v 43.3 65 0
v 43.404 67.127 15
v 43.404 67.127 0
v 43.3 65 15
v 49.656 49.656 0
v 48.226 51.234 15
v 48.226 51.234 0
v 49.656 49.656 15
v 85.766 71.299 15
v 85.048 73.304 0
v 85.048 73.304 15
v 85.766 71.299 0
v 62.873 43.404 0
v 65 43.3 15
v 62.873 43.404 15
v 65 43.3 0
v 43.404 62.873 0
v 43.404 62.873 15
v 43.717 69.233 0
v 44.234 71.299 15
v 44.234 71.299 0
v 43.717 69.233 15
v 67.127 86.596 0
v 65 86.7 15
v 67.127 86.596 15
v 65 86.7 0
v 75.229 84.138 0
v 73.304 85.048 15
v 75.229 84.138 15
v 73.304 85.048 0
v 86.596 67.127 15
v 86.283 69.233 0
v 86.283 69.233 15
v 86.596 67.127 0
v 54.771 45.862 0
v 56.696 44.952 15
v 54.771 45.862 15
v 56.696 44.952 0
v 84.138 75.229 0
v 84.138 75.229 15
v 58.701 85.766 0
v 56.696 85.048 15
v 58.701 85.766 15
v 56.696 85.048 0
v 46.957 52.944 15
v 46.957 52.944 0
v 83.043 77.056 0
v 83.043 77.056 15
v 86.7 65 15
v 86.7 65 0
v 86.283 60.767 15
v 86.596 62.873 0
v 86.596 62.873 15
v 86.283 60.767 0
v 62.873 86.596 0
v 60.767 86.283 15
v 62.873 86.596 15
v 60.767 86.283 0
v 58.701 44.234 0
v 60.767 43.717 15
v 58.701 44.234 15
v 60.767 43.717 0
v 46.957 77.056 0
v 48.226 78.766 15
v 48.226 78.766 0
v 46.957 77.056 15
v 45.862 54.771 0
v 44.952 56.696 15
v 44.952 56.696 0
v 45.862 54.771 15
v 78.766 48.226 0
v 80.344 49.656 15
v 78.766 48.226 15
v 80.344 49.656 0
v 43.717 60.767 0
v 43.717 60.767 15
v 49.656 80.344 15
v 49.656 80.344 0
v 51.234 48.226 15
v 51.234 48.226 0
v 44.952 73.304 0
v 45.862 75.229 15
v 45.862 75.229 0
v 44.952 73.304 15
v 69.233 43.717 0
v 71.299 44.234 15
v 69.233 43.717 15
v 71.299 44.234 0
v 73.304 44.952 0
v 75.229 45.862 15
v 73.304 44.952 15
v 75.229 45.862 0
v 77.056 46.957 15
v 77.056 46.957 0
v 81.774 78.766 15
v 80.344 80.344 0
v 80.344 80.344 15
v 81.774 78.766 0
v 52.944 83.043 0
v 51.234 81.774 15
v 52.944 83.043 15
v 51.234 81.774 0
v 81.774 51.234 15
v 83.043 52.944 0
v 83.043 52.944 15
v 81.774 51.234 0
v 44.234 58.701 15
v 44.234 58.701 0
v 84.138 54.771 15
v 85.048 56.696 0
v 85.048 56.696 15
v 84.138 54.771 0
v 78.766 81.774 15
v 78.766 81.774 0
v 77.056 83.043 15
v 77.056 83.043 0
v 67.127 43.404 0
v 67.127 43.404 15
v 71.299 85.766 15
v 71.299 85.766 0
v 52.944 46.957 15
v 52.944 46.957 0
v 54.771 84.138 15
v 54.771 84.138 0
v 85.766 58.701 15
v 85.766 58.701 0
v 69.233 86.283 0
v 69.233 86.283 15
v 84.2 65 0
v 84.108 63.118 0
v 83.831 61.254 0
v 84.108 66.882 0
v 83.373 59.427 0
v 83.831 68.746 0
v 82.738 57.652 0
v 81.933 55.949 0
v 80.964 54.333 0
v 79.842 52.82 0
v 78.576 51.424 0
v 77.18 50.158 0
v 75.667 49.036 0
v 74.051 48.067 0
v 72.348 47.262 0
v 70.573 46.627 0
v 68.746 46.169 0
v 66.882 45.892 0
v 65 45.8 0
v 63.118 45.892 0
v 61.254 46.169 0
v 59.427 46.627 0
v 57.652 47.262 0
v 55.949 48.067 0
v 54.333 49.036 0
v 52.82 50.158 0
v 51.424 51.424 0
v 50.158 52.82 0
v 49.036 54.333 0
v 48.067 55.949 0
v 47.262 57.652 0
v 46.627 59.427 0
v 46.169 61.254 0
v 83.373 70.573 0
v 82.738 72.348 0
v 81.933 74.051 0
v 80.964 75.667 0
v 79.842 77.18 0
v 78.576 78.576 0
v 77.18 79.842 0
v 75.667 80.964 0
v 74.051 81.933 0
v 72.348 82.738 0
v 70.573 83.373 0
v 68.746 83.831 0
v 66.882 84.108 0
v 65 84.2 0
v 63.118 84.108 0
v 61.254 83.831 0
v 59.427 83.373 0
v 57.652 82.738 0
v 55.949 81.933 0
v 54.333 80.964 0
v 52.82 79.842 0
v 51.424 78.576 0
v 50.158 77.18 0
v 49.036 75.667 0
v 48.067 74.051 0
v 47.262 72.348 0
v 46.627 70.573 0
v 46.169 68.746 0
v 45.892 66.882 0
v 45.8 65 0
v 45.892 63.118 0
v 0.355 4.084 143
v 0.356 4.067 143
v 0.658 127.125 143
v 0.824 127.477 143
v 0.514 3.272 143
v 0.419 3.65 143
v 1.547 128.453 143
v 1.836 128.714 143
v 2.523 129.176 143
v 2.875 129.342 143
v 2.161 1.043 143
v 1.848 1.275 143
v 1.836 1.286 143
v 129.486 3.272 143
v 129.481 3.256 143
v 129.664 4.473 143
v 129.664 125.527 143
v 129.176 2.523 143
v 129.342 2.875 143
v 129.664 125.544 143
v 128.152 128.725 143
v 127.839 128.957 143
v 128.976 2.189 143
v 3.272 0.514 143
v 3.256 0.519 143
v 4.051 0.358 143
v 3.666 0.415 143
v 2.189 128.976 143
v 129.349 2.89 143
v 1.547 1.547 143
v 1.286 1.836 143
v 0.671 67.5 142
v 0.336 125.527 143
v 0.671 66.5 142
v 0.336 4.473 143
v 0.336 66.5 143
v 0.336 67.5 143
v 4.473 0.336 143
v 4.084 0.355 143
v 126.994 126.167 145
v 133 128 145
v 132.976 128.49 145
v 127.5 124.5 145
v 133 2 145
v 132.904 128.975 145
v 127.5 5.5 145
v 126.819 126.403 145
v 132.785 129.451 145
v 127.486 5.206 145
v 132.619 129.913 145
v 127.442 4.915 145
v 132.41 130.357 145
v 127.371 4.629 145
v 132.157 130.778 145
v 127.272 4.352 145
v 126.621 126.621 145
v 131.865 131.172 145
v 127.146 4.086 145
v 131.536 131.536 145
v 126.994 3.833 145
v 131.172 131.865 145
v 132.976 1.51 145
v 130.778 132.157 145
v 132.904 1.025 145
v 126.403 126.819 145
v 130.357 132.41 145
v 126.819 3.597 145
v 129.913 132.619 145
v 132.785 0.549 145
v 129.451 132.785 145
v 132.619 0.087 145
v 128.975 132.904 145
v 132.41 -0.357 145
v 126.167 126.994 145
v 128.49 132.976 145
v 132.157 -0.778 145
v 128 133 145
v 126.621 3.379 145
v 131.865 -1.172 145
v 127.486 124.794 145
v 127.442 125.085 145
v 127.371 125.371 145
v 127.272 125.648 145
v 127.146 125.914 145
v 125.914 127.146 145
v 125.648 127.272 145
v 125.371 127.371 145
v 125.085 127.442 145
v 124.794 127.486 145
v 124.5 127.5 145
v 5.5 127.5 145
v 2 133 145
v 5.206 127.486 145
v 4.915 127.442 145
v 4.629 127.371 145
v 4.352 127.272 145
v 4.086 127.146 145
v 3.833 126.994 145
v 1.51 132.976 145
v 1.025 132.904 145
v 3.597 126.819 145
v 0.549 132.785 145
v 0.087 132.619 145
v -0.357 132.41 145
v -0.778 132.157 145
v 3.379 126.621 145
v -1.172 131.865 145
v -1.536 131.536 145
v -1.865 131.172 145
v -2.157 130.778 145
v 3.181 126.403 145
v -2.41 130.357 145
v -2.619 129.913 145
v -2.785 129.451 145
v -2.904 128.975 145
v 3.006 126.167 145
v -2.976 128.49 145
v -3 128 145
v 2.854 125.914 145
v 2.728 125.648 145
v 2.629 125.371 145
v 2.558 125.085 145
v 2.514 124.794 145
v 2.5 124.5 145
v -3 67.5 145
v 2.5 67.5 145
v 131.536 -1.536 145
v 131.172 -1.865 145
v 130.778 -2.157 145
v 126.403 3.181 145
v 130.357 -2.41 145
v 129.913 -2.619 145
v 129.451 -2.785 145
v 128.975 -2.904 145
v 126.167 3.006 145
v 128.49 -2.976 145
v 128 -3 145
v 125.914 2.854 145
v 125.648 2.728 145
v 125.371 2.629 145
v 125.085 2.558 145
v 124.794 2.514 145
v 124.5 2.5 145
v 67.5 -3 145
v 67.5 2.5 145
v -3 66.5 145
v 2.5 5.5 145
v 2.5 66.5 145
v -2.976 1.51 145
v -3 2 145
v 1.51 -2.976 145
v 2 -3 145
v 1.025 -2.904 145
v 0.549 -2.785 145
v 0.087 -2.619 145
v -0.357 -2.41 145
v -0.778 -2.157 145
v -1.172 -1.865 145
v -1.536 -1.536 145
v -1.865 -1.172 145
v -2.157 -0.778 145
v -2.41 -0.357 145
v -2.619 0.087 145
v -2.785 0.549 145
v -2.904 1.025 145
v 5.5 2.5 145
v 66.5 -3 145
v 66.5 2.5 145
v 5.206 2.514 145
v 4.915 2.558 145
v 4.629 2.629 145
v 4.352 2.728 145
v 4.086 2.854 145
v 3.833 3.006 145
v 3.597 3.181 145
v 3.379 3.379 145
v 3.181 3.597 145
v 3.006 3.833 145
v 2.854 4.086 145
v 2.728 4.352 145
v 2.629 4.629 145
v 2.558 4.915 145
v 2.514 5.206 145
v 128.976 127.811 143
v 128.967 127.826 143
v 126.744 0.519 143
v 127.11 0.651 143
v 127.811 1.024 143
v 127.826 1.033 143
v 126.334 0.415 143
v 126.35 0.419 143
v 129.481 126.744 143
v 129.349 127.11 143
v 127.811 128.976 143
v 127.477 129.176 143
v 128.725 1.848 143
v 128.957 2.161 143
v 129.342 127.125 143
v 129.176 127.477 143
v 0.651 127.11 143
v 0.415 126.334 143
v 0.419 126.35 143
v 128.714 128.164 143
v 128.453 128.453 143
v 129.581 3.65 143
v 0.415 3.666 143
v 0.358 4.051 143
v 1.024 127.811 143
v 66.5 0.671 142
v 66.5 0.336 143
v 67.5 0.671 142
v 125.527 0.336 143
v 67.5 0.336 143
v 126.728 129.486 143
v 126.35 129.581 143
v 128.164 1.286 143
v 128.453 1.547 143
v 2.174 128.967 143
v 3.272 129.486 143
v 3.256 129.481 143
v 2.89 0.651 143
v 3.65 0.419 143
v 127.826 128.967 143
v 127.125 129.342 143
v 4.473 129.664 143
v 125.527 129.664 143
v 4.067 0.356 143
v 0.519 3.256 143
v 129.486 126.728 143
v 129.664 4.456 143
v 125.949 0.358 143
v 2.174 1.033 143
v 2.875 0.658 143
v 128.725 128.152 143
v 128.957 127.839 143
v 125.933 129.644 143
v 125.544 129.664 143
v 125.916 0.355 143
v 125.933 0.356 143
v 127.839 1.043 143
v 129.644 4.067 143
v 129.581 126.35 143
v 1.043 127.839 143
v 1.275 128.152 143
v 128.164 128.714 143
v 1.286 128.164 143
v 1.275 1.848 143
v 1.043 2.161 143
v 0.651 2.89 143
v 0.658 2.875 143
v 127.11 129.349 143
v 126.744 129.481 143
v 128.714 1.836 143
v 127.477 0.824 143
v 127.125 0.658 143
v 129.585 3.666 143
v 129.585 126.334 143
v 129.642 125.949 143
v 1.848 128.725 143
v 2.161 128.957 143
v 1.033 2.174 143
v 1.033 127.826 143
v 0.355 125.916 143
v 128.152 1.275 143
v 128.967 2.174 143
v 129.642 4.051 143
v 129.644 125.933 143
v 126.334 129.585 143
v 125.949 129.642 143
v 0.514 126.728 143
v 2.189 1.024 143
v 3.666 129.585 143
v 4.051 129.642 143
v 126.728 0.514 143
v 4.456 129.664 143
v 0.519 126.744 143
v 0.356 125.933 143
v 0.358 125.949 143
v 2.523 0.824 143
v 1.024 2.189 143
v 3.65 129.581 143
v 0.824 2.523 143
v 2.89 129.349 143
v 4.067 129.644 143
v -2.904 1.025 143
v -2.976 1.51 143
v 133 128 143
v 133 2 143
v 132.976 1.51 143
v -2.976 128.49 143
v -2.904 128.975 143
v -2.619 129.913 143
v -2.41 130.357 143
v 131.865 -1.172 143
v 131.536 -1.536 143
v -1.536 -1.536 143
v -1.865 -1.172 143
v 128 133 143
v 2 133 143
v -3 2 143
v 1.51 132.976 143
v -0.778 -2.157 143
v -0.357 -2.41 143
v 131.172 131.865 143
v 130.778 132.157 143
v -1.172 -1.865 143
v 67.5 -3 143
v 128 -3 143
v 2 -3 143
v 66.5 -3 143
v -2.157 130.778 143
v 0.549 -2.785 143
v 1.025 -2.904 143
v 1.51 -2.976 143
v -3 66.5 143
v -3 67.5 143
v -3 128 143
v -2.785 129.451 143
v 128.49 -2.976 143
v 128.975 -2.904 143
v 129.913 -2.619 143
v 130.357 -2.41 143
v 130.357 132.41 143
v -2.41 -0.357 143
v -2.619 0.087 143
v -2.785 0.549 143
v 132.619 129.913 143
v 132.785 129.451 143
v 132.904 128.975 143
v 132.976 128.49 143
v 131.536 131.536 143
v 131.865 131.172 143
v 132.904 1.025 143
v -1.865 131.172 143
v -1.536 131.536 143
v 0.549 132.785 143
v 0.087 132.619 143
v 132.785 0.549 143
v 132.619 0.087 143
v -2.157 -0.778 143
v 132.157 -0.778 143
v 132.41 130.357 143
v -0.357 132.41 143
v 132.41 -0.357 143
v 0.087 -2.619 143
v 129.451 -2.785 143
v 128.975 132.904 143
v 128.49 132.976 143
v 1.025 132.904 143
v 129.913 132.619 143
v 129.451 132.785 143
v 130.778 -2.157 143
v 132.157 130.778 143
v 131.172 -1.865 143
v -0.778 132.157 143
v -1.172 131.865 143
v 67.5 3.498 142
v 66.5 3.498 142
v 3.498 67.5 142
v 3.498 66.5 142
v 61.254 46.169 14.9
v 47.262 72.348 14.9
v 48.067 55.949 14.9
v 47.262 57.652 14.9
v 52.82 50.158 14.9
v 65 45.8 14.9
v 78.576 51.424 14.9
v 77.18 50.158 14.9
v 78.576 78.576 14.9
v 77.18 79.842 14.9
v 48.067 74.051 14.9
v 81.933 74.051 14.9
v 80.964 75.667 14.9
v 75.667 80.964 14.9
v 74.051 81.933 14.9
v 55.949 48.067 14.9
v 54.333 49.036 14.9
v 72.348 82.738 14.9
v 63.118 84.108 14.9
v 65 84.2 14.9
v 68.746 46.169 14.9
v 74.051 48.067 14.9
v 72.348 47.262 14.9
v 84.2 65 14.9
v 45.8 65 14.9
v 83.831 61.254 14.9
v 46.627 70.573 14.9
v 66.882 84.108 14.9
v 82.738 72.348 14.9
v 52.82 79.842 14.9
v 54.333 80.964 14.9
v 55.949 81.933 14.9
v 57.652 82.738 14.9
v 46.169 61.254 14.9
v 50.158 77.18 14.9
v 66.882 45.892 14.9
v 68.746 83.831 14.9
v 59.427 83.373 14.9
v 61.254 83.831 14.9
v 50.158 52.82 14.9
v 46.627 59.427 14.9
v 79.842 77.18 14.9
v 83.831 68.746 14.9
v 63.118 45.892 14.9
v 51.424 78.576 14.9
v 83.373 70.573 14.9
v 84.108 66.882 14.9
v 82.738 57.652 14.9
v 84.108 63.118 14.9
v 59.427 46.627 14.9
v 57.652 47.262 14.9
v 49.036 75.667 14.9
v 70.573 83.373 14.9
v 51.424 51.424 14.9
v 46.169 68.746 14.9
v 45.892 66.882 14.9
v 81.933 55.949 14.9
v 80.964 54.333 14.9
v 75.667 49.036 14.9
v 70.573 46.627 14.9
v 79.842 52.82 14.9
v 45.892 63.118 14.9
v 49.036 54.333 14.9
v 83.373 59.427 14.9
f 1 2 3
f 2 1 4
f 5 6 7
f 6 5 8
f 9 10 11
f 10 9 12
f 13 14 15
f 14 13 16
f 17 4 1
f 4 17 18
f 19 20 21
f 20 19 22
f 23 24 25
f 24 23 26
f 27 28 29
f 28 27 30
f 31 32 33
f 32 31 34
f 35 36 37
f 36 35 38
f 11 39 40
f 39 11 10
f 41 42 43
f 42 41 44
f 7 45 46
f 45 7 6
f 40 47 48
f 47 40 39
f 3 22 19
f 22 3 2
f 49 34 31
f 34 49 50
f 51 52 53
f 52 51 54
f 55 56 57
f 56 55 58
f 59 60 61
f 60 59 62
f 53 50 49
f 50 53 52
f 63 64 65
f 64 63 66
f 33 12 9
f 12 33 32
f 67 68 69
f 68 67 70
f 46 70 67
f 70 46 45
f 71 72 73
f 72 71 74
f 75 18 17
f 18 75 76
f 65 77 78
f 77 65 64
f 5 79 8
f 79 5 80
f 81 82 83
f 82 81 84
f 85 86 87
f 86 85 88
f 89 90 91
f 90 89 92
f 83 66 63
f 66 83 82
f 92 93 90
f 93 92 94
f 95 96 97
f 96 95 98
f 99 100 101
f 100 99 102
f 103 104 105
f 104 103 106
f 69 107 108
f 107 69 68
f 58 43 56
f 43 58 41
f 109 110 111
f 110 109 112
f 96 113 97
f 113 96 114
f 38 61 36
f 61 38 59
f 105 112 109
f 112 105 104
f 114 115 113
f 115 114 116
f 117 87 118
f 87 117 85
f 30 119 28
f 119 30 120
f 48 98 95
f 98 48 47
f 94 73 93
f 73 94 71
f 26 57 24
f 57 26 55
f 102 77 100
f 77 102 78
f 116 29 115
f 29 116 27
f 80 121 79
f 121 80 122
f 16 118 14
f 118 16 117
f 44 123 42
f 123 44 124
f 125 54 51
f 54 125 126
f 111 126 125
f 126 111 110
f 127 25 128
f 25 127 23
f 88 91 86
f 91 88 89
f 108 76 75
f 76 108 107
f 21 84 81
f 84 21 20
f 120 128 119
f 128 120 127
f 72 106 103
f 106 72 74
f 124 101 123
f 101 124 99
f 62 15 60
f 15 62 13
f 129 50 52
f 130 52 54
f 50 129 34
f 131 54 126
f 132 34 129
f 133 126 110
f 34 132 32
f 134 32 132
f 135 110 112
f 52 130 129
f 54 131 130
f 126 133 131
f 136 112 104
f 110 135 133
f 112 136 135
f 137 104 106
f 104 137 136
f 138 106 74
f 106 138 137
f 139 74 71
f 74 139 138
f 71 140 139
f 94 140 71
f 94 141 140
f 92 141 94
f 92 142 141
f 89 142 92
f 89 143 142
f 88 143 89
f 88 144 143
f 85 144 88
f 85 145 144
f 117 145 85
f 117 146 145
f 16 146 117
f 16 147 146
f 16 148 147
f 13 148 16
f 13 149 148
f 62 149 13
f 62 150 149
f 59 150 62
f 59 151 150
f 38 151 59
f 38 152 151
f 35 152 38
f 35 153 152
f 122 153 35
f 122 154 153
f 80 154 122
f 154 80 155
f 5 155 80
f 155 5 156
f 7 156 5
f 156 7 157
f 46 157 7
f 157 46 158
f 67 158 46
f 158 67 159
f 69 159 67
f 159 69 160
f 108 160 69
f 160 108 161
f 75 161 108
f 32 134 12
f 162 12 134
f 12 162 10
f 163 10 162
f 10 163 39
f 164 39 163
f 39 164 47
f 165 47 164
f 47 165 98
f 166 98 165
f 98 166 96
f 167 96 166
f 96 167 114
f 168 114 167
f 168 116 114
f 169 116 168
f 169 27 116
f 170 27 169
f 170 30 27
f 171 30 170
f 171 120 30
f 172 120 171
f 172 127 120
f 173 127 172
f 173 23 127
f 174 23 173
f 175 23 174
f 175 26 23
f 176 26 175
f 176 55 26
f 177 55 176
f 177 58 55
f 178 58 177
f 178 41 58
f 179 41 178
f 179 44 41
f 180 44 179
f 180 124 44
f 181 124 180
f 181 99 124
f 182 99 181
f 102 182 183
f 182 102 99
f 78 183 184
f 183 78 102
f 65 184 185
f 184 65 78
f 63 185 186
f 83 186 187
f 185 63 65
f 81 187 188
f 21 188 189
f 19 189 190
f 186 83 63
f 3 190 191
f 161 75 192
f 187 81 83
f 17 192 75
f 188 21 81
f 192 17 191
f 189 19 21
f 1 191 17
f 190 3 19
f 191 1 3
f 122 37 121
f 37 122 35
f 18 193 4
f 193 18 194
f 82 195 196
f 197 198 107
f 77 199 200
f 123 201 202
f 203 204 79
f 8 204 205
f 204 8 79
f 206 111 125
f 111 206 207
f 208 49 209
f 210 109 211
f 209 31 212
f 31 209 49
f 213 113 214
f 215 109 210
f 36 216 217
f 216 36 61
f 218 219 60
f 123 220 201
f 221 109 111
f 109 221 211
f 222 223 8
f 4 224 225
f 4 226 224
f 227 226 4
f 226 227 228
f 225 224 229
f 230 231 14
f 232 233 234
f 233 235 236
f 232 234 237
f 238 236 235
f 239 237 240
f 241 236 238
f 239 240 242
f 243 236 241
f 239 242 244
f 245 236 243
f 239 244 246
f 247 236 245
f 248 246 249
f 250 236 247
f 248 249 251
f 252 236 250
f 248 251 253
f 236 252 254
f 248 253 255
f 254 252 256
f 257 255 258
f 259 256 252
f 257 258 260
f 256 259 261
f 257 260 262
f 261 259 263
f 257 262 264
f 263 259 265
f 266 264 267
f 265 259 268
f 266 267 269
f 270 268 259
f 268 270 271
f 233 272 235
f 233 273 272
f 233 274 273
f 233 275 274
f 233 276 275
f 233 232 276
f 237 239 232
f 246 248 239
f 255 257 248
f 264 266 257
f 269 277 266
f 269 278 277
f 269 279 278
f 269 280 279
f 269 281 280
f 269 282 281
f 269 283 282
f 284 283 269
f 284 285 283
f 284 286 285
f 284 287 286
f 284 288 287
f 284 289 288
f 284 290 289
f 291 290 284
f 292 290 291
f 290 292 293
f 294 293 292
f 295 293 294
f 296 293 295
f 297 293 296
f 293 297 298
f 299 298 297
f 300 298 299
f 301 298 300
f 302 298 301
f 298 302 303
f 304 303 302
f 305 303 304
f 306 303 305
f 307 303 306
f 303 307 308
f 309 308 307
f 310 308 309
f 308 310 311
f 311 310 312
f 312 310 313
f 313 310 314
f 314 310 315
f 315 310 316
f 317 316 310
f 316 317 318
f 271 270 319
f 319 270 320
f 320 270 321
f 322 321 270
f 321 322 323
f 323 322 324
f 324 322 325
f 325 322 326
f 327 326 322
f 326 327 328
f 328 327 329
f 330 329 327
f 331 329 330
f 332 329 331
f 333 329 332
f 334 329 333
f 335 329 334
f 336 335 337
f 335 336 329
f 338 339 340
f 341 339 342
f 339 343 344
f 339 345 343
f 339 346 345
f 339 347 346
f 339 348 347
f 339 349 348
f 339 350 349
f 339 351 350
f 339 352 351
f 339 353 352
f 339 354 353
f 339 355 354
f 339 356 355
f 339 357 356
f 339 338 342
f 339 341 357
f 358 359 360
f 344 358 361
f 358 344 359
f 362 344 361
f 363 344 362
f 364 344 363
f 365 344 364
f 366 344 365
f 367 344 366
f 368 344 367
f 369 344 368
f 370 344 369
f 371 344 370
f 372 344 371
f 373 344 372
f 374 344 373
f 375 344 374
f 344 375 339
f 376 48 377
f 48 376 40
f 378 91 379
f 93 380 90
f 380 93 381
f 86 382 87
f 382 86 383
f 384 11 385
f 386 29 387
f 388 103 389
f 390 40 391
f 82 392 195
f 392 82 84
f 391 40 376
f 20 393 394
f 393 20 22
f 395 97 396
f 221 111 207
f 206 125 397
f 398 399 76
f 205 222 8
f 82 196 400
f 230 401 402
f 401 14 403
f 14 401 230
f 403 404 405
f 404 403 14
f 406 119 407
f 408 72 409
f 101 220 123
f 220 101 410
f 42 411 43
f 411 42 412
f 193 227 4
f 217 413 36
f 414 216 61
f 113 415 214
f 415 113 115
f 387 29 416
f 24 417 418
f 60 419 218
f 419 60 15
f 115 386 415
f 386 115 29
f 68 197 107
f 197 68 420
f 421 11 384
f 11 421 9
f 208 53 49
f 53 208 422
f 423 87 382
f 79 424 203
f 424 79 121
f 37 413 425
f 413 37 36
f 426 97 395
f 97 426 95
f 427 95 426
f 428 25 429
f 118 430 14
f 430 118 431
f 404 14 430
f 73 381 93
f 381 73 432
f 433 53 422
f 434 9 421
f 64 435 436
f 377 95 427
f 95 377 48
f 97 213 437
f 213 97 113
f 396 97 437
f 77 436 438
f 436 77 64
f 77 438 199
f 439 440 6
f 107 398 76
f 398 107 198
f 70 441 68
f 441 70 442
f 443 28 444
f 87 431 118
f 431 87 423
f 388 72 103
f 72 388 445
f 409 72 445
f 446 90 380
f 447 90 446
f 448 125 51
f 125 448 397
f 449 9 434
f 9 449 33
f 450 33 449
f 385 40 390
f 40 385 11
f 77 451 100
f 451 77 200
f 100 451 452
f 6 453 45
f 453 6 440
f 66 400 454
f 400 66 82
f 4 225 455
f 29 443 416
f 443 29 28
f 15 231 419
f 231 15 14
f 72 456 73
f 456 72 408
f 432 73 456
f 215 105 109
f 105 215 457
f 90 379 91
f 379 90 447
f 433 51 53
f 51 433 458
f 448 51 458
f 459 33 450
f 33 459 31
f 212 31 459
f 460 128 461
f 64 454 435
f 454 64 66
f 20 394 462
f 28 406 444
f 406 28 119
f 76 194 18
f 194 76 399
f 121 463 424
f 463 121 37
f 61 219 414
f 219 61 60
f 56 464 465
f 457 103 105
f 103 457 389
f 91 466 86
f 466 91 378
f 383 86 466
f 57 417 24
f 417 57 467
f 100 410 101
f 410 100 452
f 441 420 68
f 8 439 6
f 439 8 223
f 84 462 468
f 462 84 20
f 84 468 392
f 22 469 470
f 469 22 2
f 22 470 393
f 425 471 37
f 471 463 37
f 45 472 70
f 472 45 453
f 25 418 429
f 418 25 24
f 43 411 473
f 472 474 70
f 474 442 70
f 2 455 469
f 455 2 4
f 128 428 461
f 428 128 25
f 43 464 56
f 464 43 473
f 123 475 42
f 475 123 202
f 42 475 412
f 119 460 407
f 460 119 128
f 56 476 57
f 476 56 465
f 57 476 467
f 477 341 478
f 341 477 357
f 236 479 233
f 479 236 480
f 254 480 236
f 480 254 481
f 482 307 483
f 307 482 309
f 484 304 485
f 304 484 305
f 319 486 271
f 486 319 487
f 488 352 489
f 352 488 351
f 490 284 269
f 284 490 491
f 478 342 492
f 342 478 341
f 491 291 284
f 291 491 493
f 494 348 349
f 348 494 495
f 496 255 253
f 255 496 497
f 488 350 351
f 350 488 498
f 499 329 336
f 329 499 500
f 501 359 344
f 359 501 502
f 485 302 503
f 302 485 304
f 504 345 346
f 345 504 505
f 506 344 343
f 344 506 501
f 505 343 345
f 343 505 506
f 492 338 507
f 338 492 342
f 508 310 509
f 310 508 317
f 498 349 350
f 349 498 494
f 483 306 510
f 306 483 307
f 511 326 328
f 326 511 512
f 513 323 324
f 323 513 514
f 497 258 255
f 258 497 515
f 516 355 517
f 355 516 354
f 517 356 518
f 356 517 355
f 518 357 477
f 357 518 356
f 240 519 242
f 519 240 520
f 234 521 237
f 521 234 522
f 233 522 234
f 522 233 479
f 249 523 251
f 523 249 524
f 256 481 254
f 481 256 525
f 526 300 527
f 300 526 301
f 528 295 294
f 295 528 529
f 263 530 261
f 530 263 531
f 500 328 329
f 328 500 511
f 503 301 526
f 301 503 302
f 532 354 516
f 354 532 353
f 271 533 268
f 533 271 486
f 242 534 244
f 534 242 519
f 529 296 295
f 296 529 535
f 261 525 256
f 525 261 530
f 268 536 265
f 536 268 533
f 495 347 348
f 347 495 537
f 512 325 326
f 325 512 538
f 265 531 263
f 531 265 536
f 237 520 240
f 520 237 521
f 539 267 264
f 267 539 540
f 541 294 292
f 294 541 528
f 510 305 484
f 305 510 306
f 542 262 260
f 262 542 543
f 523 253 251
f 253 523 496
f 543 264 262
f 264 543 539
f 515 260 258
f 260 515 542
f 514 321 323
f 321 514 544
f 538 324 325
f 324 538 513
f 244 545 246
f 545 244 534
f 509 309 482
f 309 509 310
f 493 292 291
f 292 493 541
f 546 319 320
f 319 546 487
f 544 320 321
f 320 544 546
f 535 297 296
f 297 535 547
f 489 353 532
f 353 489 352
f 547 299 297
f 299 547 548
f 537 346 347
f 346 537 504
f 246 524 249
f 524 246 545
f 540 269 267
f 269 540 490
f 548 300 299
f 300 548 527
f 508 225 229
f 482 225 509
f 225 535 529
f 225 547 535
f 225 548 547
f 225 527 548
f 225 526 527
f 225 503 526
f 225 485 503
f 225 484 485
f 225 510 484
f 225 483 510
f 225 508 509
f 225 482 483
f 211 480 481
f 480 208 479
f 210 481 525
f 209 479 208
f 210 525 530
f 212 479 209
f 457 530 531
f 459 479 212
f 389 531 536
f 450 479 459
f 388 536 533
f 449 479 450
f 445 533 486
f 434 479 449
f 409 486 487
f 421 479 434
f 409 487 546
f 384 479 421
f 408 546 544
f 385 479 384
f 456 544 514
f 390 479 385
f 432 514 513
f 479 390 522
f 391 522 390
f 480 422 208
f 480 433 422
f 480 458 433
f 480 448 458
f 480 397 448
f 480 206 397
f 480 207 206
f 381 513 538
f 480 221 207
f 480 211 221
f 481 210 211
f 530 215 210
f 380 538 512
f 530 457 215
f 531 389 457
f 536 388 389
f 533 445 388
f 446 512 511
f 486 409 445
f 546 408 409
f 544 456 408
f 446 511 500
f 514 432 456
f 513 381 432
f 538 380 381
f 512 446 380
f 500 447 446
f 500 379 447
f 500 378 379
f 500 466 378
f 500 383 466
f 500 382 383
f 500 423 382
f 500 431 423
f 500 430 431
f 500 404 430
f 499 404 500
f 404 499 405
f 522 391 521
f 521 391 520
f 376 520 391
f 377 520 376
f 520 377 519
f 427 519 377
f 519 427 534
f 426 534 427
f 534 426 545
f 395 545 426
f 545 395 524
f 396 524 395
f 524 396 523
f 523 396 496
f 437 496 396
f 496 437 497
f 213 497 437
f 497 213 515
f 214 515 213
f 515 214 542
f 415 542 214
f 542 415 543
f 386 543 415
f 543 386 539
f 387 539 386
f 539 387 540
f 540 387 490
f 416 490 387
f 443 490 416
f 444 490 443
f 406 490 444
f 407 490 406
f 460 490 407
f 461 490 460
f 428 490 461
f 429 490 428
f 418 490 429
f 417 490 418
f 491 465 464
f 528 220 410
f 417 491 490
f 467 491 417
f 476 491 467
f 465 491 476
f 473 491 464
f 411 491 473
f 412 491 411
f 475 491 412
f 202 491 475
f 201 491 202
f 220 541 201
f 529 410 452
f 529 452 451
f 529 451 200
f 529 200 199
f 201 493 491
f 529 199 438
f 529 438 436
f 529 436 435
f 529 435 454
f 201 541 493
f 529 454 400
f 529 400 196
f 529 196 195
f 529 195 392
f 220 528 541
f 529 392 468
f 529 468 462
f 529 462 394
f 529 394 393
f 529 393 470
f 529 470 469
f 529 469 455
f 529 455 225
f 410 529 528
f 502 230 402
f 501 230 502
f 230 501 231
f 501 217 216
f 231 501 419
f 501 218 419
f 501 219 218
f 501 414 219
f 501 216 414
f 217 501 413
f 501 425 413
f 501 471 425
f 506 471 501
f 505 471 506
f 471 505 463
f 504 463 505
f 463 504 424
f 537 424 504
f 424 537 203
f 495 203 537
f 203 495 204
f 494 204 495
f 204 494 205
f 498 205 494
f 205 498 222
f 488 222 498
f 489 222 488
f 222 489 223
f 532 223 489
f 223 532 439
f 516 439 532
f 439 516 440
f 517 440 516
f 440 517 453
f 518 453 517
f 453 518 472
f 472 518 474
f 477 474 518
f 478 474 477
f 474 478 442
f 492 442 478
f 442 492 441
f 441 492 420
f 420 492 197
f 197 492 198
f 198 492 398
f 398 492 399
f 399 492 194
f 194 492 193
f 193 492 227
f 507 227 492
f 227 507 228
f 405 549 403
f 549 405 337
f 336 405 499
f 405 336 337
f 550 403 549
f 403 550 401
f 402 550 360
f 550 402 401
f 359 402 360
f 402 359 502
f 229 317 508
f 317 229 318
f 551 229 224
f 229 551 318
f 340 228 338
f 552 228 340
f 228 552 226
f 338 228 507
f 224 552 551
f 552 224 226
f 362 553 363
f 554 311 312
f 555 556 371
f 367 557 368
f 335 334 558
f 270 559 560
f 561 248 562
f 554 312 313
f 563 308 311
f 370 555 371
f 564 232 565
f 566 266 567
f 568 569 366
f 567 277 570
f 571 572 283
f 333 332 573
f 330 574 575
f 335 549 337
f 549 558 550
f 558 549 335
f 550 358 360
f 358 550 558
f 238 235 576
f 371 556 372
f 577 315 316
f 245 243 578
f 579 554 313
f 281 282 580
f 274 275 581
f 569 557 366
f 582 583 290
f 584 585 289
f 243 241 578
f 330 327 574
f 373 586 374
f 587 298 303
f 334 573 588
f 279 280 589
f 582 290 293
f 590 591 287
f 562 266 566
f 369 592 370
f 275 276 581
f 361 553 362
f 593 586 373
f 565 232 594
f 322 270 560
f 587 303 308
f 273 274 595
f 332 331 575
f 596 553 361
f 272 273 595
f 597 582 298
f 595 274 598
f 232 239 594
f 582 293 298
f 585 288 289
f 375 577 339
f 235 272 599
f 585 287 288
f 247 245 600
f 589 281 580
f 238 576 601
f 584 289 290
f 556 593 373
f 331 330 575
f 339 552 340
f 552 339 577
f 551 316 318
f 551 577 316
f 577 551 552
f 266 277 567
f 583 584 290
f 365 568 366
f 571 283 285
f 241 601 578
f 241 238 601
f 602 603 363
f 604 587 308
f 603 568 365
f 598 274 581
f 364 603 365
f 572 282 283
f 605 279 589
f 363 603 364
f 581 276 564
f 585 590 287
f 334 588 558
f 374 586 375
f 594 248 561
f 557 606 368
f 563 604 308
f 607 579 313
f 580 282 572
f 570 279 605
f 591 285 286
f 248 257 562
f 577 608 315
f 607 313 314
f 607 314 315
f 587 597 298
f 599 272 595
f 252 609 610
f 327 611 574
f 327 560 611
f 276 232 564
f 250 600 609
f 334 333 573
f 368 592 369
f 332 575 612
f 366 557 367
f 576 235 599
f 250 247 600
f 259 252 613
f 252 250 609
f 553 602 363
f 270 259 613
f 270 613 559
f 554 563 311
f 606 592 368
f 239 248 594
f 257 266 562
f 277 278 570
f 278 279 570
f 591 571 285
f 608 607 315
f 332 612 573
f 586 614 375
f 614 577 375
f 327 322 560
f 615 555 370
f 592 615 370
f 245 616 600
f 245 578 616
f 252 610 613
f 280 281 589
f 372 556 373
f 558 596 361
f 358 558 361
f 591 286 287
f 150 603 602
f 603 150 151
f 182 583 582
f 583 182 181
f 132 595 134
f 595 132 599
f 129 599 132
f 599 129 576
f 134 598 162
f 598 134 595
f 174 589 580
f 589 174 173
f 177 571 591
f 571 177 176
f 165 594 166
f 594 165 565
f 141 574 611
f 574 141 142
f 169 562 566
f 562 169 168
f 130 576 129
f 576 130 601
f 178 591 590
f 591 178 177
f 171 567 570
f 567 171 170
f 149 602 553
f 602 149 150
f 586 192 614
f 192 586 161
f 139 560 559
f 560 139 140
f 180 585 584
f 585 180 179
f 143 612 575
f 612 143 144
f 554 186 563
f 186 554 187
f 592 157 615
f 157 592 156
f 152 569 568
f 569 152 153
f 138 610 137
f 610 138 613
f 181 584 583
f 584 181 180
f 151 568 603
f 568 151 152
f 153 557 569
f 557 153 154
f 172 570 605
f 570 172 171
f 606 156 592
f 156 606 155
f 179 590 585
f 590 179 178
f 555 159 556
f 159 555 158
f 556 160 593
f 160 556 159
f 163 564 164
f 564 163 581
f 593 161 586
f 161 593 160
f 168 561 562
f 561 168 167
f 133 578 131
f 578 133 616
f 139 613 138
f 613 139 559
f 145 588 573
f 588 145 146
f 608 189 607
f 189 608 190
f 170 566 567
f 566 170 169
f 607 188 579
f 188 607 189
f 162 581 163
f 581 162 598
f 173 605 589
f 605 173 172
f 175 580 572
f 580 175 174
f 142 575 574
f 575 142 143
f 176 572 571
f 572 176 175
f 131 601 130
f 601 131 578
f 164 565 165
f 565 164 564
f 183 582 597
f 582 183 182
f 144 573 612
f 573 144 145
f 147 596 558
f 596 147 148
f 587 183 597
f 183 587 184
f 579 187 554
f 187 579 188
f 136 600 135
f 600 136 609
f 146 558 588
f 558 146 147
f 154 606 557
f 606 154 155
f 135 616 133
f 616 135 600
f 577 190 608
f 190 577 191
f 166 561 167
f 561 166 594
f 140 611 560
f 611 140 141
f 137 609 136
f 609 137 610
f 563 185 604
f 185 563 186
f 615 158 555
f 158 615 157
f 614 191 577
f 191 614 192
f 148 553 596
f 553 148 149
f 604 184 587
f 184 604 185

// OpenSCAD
// file: params.scad
// Cat Feeder 5000 — Shared Parameters & Common Modules
// Include this file first in all part files: include <params.scad>

// ===== DIMENSIONS =====
WALL = 3;                // Standard wall thickness (mm)
THIN_WALL = 2.5;         // Thin walls (antenna arch, etc.)
FLOOR = 4;               // Base floor thickness
INSERT_BORE = 4.7;       // M3 heat-set insert pocket bore
M3_CLEAR = 3.4;          // M3 clearance hole
UNIT_W = 160;            // Main body width
UNIT_D = 240;            // Main body depth
UNIT_H = 160;            // Main body height
GATE_W = 118;            // Gate flap width
GATE_H = 90;             // Gate flap height
GATE_T = 3;              // Gate flap thickness
GATE_ROD_D = 3.2;        // Gate hinge rod diameter
HALO_CLEAR_W = 130;      // Round halo inner clear width
HALO_TUBE_OD = 24;       // Halo tube outer diameter
HALO_LEG_H = 77;         // Halo leg height (floor to arch start)
GATE_SETBACK = 40;       // Gate Y position inside body (mm from front face)
SERVO_W = 23;            // SG90 servo width
SERVO_D = 12.5;          // SG90 servo depth
SERVO_H = 30;            // SG90 servo height
SERVO_EAR_SPAN = 28;     // SG90 servo ear spacing
TOLERANCE = 0.1;         // General fit tolerance

// ===== AUGER =====
AUGER_TUBE_ID = 32;         // Auger tube inner diameter
AUGER_TUBE_OD = 38;         // Auger tube outer diameter
AUGER_TUBE_L = 85;          // Auger tube length
AUGER_PITCH = 20;           // Auger screw thread pitch
AUGER_ANGLE = 30;           // Auger tube angle from vertical (degrees)

// ===== ROOF & COUPLING =====
ROOF_T = 5;                    // Roof thickness (holds M3 inserts)
AUGER_COUPLING_H = 15;        // Coupling stub above auger flange

// ===== BOWL =====
BOWL_FLOOR_W = 100;         // Bowl floor width
BOWL_FLOOR_D = 90;          // Bowl floor depth
BOWL_SIDE_H = 25;           // Bowl side wall height
BOWL_BACK_H = 30;           // Bowl back wall height
BOWL_FLOOR_T = 3;           // Bowl floor thickness
BOWL_WALL_T = 2.5;          // Bowl wall thickness
BOWL_OVERHANG = 15;         // Bowl floor extends past gate plane

// ===== FOOD =====
COL_FOOD = [0.9, 0.7, 0.3, 0.8]; // Tan — food-contact parts

// ===== RENDER QUALITY =====
$fn = 64;                // Circle resolution (smooth curves)

// ===== COLORS =====
COL_RFID = [0.8, 0.2, 0.2, 0.8];      // Red — RFID antenna arch
COL_TPU = [0.4, 0.7, 0.3, 0.8];       // Green — TPU flexible parts
COL_GATE = [0.2, 0.5, 0.8, 0.8];      // Blue — Gate mechanism
COL_BODY = [0.6, 0.6, 0.6, 0.8];      // Gray — Main body structure

// ===== COMMON MODULES =====

// M3 heat-set insert pocket (bore hole for pressed insert)
module m3_insert(h = 8) {
    cylinder(d = INSERT_BORE, h = h);
}

// M3 clearance hole (for bolt pass-through)
module m3_clear(h = 8) {
    cylinder(d = M3_CLEAR, h = h);
}

// Fillet box: rectangular box with filleted corners
// w, d, h = width, depth, height; r = corner radius
module fillet_box(w, d, h, r = 2) {
    hull() {
        translate([r, r, 0])
            cylinder(r = r, h = h);
        translate([w - r, r, 0])
            cylinder(r = r, h = h);
        translate([r, d - r, 0])
            cylinder(r = r, h = h);
        translate([w - r, d - r, 0])
            cylinder(r = r, h = h);
    }
}

// Boss: raised circular pad with M3 pocket
// Useful for internal reinforcement at bolt points
module boss(d = 10, h = 4, pocket = true) {
    difference() {
        cylinder(d = d, h = h);
        if (pocket)
            translate([0, 0, -0.1])
                m3_clear(h = h + 0.2);
    }
}
// main file
// Cat Feeder 5000 — Part 02: Food Hopper
// Funnel reservoir. Sits on auger flange via slip-fit coupling sleeve.
// ~500mL / ~400g kibble.
// Print: PETG, 0.25mm layers, 25% infill, no supports

include <params.scad>

color(COL_FOOD) hopper();

module hopper() {
    TOP_W = 130; TOP_D = 130; HOPPER_H = 130;
    LIP_H = 2; LIP_T = 3;

    // Coupling sleeve dimensions (slip fit over auger stub)
    SLEEVE_ID = AUGER_TUBE_OD + 0.4;    // 38.4mm
    SLEEVE_OD = SLEEVE_ID + 2*THIN_WALL; // 43.4mm
    SZ = AUGER_COUPLING_H;               // Sleeve height = funnel Z offset

    difference() {
        union() {
            // Coupling sleeve at bottom (slides over auger stub)
            translate([TOP_W/2, TOP_D/2, 0])
                cylinder(d=SLEEVE_OD, h=SZ);

            // Outer funnel shell (hull between top square and bottom sleeve)
            hull() {
                translate([0, 0, SZ + HOPPER_H - 1])
                    fillet_box(TOP_W, TOP_D, 1, r=4);
                translate([TOP_W/2, TOP_D/2, SZ])
                    cylinder(d=SLEEVE_OD, h=1);
            }

            // Lip for lid at top
            translate([-LIP_T, -LIP_T, SZ + HOPPER_H - LIP_H])
                fillet_box(TOP_W + 2*LIP_T, TOP_D + 2*LIP_T, LIP_H, r=5);
        }

        // Hollow interior (funnel tapers to sleeve bore)
        hull() {
            translate([THIN_WALL, THIN_WALL, SZ + HOPPER_H])
                fillet_box(TOP_W - 2*THIN_WALL, TOP_D - 2*THIN_WALL, 1, r=3);
            translate([TOP_W/2, TOP_D/2, SZ - 0.1])
                cylinder(d=SLEEVE_ID, h=1);
        }

        // Sleeve bore (through the coupling sleeve)
        translate([TOP_W/2, TOP_D/2, -0.1])
            cylinder(d=SLEEVE_ID, h=SZ + 0.2);

        // Vent slots under top lip
        for (i = [0:3])
            rotate([0, 0, i*90])
                translate([TOP_W/2 + LIP_T/2, -5, SZ + HOPPER_H - LIP_H - 1])
                    cube([1, 10, LIP_H + 2]);
    }
}
